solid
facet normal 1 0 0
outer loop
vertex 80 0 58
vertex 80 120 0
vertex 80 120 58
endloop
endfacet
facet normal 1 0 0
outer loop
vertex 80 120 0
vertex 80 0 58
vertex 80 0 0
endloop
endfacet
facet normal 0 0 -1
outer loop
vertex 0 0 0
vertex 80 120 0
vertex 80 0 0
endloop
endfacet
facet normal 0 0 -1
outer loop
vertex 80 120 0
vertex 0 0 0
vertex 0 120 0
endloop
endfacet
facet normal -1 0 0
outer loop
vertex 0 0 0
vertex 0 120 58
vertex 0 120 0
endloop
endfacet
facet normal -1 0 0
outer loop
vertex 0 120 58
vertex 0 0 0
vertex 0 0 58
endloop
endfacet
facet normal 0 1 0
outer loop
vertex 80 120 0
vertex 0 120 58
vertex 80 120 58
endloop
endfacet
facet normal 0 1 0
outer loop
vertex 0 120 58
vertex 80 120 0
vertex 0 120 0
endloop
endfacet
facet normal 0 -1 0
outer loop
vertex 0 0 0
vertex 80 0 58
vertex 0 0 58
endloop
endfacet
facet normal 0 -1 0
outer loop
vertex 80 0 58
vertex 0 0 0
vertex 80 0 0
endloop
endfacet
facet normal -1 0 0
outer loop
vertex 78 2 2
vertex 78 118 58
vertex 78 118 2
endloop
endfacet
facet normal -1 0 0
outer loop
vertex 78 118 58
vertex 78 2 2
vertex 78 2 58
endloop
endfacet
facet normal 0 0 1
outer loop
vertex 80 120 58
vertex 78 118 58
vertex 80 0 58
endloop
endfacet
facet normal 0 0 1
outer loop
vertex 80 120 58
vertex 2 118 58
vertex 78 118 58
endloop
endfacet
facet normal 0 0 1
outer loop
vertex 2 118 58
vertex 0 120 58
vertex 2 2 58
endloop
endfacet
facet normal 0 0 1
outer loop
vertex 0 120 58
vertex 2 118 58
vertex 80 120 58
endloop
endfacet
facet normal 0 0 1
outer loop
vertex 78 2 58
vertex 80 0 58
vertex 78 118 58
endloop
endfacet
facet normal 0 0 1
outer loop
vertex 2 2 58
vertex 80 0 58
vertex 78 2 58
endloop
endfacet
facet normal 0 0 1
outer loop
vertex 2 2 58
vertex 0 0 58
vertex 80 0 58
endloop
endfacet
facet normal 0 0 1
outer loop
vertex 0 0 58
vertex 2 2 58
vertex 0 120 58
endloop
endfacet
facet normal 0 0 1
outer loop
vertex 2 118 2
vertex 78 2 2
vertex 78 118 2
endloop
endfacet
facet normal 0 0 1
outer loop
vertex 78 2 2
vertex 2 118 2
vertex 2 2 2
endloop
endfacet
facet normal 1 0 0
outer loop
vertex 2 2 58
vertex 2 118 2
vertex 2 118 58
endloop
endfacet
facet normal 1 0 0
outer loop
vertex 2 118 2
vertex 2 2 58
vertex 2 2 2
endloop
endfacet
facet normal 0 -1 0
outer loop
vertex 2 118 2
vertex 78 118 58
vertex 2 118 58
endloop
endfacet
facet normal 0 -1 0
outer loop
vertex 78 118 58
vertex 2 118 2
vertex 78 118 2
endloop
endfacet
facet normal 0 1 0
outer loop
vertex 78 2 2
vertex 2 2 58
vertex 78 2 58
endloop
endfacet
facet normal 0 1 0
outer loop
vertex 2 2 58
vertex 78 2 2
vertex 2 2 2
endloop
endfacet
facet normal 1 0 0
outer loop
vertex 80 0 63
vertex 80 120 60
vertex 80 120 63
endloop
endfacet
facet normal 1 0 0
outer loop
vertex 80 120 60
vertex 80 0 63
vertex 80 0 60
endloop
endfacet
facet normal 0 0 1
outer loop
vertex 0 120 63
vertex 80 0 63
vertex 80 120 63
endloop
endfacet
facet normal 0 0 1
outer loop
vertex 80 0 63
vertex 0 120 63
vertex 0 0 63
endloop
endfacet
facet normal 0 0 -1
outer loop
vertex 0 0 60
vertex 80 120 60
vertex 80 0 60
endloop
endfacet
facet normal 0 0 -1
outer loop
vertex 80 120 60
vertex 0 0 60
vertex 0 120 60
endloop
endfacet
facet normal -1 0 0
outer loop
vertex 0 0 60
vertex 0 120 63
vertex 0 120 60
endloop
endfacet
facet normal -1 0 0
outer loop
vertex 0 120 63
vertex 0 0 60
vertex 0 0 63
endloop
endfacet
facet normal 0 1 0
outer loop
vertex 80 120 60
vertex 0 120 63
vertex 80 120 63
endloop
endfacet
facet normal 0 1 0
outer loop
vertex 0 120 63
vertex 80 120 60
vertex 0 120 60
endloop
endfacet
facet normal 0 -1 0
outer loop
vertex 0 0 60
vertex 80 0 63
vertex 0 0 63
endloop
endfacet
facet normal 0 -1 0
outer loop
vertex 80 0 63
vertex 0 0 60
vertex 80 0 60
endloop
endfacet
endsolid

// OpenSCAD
// 03_stackable_bins.scad
// Advanced: Stackable storage bins
// Parameters
bin_w = 80;      // width
bin_d = 120;     // depth
bin_h = 60;      // height
wall = 2;        // wall thickness
rim = 3;         // interlock rim height
chamfer = 2;
stack_clear = 0.6; // clearance between stacks

module outer(){
  cube([bin_w, bin_d, bin_h]);
}

module inner(){
  translate([wall, wall, wall])
    cube([bin_w-2*wall, bin_d-2*wall, bin_h-2*wall]);
}

module body(){
  difference(){ outer(); inner(); }
}

module rim_outer(){
  translate([0,0,bin_h]) cube([bin_w, bin_d, rim]);
}

module rim_inner(){
  translate([wall+stack_clear, wall+stack_clear, bin_h])
    cube([bin_w-2*(wall+stack_clear), bin_d-2*(wall+stack_clear), rim]);
}

module chamfer_edges(){
  // Simple top edge chamfer via difference
  difference(){
    children();
    translate([-1,-1,bin_h-chamfer]) cube([bin_w+2, bin_d+2, chamfer+2]);
  }
}

union(){
  chamfer_edges(){ body(); }
  rim_outer();
  difference(){ rim_outer(); rim_inner(); }
}
